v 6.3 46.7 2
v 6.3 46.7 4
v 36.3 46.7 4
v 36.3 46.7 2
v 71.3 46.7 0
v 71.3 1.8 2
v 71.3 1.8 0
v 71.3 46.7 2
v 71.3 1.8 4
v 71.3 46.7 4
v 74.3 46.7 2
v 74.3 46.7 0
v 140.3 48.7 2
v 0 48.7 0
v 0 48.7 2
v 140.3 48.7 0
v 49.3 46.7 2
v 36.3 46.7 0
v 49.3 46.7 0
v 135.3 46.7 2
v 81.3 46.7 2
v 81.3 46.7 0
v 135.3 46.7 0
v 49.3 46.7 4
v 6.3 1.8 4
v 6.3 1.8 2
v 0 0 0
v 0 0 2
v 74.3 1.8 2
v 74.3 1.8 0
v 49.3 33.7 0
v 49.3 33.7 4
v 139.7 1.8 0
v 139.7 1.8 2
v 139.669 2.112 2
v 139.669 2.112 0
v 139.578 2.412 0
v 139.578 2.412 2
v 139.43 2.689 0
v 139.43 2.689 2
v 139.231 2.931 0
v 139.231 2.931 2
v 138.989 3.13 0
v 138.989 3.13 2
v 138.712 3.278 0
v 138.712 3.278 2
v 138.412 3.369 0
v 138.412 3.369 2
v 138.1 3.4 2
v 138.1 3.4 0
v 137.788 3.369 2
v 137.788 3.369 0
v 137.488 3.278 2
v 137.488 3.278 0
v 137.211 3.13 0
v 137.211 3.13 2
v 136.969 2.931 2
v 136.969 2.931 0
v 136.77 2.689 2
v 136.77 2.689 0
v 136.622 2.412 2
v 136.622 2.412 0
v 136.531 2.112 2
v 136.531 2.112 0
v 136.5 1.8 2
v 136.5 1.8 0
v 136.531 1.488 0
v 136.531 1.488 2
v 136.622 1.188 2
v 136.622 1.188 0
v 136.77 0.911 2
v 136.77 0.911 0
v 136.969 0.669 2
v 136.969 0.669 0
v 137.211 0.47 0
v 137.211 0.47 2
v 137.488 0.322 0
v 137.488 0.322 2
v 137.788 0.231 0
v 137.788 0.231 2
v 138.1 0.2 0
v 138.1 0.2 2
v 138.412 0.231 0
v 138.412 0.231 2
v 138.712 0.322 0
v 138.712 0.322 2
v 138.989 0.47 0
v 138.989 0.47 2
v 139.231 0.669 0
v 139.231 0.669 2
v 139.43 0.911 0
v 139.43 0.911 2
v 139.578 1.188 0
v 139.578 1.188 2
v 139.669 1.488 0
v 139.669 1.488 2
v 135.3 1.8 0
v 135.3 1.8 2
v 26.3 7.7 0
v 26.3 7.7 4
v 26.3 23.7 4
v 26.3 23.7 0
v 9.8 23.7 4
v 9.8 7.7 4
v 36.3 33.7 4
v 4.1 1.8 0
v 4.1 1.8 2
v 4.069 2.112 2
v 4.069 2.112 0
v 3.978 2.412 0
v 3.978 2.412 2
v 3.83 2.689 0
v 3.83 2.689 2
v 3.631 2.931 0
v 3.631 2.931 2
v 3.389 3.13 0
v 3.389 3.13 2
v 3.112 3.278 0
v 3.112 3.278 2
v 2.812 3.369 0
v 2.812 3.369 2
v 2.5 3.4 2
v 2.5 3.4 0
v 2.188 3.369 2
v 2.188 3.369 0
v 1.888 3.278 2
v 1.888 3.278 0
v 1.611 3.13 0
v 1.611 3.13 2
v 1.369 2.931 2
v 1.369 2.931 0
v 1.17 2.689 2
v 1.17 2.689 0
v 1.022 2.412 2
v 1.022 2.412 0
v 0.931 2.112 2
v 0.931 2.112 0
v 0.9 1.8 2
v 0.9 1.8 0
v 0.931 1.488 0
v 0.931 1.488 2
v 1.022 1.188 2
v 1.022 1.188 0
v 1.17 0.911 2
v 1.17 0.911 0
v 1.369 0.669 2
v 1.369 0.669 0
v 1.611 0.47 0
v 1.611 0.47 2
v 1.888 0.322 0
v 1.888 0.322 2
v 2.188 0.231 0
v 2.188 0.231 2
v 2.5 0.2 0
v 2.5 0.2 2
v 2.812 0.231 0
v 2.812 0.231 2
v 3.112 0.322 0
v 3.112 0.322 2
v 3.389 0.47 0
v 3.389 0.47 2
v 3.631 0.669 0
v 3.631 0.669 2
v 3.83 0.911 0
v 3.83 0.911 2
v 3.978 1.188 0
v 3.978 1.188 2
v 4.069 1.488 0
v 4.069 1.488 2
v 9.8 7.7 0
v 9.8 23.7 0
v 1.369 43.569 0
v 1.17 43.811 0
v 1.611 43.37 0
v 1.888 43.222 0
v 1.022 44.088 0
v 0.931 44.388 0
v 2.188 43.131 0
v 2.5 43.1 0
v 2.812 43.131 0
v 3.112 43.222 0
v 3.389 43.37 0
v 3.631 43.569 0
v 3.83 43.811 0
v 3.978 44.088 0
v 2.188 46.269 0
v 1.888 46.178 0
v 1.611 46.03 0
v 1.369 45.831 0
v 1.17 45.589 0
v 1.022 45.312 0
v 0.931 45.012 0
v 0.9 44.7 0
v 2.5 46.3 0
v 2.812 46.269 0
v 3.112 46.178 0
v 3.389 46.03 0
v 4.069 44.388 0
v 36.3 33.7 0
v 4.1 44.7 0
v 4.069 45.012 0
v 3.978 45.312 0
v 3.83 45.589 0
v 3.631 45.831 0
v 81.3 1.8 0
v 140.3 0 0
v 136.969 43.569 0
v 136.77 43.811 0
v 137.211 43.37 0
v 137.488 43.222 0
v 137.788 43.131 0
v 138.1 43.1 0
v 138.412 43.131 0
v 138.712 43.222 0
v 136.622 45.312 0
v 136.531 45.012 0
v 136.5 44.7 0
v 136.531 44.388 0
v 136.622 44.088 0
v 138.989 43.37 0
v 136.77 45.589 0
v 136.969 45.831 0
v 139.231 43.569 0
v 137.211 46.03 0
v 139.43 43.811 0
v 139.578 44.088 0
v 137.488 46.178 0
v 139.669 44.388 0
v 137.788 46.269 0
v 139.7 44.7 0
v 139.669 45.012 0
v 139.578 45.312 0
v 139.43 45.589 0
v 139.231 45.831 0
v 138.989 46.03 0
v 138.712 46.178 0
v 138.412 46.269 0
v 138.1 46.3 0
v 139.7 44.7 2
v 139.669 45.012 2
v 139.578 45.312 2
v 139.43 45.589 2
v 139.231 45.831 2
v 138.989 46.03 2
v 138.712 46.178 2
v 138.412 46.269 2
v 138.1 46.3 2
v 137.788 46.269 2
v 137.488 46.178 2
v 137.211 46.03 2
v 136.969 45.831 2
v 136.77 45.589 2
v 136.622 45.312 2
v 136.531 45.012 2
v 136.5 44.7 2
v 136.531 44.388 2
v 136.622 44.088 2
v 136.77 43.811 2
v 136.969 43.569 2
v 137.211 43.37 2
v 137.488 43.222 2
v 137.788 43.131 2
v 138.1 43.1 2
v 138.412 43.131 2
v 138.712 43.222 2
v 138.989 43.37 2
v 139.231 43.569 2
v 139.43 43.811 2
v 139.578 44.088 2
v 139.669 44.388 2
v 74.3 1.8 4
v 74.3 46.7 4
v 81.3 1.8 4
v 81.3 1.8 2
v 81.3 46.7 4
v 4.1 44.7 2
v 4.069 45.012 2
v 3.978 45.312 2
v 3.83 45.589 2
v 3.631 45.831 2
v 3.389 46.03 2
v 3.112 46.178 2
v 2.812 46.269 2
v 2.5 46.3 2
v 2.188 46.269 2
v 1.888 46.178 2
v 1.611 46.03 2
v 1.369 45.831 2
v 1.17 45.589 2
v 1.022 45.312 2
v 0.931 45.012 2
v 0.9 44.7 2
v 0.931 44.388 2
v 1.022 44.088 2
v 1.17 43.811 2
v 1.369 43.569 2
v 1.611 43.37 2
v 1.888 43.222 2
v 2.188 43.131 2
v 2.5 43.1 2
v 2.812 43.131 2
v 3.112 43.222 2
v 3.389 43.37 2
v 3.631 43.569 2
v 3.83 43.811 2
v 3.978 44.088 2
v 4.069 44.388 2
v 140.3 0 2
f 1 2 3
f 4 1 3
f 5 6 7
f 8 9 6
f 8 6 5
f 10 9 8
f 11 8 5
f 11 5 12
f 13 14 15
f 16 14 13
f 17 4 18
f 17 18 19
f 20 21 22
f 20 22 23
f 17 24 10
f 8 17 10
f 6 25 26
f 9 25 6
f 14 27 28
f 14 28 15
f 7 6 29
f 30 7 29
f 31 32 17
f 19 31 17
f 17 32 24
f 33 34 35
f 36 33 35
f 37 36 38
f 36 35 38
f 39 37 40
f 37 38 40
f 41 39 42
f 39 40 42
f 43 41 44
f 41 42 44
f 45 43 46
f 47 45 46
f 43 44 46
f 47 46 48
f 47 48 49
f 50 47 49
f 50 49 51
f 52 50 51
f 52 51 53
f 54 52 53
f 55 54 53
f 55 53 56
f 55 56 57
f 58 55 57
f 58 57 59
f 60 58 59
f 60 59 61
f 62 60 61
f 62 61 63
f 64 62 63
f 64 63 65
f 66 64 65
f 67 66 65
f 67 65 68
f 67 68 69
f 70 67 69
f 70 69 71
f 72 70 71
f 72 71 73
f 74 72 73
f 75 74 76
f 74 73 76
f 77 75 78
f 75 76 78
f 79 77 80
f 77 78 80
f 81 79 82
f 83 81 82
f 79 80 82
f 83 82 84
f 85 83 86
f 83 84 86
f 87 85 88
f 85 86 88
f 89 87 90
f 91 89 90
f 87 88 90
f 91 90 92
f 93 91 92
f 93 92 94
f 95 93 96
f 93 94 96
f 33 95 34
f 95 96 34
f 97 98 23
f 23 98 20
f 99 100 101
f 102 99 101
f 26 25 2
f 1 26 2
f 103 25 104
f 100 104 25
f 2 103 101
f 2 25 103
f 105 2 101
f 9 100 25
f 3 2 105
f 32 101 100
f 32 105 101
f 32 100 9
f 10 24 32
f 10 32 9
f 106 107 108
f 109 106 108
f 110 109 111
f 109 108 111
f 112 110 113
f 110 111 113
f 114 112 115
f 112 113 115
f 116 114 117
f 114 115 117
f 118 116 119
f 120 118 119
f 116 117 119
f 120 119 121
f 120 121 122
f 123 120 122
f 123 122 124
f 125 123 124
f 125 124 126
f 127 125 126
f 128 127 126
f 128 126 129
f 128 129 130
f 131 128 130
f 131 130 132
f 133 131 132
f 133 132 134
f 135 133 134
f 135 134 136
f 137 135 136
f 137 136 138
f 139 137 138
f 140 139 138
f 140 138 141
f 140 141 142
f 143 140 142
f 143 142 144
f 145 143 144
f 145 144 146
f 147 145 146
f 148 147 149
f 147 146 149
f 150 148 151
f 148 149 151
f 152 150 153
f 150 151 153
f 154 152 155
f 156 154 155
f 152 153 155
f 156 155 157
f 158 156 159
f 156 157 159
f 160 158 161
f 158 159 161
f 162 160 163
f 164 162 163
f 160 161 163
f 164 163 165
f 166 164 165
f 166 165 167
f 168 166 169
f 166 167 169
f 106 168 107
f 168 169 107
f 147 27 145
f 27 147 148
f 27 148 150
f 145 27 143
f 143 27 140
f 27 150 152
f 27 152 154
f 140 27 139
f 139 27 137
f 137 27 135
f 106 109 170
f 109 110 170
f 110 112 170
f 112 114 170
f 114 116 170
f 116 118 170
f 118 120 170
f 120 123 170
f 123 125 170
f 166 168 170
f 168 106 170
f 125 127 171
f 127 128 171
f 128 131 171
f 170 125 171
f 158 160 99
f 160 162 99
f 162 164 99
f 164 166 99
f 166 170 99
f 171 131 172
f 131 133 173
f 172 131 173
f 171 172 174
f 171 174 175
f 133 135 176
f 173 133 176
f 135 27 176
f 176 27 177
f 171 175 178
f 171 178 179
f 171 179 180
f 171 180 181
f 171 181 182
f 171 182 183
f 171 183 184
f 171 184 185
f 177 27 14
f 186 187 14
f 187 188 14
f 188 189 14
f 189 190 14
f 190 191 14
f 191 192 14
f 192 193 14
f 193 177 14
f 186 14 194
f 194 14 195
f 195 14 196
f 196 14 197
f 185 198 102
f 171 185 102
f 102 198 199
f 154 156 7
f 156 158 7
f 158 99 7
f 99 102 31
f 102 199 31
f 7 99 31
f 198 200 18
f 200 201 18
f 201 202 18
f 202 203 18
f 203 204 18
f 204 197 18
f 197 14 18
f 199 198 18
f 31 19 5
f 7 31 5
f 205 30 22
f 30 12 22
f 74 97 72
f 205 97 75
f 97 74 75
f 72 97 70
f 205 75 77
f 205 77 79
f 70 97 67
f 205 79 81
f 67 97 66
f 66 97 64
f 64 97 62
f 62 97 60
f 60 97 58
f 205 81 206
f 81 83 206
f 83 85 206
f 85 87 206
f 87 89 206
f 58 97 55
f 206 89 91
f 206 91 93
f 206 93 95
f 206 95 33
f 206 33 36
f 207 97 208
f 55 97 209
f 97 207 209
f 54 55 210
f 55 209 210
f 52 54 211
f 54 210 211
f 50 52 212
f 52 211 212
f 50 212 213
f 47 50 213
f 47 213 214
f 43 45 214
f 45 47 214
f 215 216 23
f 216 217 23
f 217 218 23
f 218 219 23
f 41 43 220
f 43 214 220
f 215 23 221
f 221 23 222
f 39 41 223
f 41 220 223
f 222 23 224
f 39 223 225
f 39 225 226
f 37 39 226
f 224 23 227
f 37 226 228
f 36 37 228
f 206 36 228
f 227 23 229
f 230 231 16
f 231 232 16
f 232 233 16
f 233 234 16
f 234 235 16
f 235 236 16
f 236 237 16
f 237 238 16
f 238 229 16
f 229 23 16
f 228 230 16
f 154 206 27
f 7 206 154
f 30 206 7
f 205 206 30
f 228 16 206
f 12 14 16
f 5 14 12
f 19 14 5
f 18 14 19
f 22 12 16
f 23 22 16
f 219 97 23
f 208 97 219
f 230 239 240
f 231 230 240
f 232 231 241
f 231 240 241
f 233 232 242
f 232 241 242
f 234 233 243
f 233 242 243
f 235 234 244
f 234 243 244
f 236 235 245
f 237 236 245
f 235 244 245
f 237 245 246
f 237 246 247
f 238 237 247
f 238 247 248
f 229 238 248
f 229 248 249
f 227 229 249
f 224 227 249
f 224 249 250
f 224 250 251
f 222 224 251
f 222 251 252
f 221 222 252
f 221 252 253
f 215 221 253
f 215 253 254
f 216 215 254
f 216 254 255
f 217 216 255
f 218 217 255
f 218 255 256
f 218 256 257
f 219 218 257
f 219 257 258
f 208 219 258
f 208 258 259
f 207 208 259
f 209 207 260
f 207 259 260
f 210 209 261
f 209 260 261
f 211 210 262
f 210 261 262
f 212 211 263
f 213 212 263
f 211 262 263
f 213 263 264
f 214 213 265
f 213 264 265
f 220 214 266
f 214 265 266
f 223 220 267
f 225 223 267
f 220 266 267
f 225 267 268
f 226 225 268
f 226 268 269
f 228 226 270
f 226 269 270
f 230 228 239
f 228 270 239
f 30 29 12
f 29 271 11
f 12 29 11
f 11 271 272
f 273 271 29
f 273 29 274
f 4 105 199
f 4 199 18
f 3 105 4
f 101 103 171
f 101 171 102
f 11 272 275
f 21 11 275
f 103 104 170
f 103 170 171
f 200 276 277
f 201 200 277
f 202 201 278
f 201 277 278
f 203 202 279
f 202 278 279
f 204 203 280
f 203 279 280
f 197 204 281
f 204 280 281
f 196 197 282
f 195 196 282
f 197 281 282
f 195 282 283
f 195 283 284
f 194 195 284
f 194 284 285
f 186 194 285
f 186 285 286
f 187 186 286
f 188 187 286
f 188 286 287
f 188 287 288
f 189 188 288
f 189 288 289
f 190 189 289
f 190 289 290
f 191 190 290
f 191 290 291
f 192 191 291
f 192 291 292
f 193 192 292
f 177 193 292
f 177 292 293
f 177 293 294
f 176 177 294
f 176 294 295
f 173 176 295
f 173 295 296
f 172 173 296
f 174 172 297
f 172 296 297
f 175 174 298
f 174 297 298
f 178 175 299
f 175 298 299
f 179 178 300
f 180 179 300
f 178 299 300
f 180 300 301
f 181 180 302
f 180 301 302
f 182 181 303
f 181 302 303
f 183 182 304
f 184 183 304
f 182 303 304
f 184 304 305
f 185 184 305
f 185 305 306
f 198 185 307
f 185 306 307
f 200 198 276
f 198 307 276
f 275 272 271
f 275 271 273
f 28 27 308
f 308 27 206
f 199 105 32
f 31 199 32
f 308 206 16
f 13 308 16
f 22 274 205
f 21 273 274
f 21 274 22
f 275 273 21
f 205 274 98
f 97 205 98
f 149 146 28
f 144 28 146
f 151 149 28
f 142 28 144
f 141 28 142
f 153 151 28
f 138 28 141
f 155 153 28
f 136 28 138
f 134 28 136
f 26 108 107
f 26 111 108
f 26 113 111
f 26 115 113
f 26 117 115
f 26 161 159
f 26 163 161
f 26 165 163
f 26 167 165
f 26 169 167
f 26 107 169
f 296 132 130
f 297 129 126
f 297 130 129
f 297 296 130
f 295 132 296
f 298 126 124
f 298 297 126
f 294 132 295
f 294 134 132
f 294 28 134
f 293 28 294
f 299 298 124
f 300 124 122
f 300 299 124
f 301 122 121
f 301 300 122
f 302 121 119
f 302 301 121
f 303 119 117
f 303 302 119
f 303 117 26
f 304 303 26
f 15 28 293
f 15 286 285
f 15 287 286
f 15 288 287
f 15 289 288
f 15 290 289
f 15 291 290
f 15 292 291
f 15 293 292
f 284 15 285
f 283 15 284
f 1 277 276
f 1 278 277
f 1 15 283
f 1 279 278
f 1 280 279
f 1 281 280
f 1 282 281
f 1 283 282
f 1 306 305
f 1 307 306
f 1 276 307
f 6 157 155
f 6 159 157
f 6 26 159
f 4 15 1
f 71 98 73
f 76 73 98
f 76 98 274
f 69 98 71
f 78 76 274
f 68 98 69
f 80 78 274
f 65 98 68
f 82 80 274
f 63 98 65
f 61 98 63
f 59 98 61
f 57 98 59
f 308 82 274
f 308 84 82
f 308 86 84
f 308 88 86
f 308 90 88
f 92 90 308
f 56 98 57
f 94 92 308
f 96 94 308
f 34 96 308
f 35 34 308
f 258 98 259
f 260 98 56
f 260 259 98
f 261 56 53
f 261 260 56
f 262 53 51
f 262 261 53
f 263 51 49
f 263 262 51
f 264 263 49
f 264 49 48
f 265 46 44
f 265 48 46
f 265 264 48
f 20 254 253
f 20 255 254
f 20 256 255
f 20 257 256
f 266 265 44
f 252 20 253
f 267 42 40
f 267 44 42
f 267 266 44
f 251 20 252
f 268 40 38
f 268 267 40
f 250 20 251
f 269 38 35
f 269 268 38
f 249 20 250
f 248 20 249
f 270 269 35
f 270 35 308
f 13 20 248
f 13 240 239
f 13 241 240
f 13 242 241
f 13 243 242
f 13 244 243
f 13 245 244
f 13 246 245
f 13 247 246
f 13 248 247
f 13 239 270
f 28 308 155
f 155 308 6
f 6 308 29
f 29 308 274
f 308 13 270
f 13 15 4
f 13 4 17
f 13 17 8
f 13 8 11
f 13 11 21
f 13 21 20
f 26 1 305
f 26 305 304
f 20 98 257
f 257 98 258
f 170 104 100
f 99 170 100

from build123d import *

# Parameters (mm, degrees)
SKETCH_2_W               = 140.3
SKETCH_2_H               = 48.7
EXTRUDE_1_DEPTH          = 4
SKETCH_3_W               = 140.3
SKETCH_3_H               = 48.7
SKETCH_3_R               = 1.6
SKETCH_3_W_2             = 129
SKETCH_3_H_2             = 44.9
CUT_EXTRUDE_1_DEPTH      = 2
SKETCH_6_W               = 54
SKETCH_6_H               = 44.9
SKETCH_6_W_2             = 3
SKETCH_6_W_3             = 13
SKETCH_6_H_2             = 13
SKETCH_6_W_4             = 10
SKETCH_6_H_3             = 16
SKETCH_6_R               = 1.6
CUT_EXTRUDE_2_DEPTH      = 149.565743023
CUT_EXTRUDE_3_DEPTH      = 149.565743023
CUT_EXTRUDE_3_DEPTH_BACK = 10
SKETCH_7_W               = 6.5
SKETCH_7_H               = 16


with BuildPart() as part:
    # 草图2 → 凸台-拉伸1 (new body)
    with BuildSketch(Plane.XY):
        with Locations((70.15, 24.35)):
            Rectangle(SKETCH_2_W, SKETCH_2_H)
    extrude(amount=EXTRUDE_1_DEPTH)

    # 草图3 → 切除-拉伸1 (cut)
    with BuildSketch(Plane.XY.offset(4)):
        with Locations((70.15, 24.35)):
            Rectangle(SKETCH_3_W, SKETCH_3_H)
        with Locations((138.1, 1.8)):
            Circle(SKETCH_3_R, mode=Mode.SUBTRACT)
        with Locations((138.1, 44.7)):
            Circle(SKETCH_3_R, mode=Mode.SUBTRACT)
        with Locations((2.5, 1.8)):
            Circle(SKETCH_3_R, mode=Mode.SUBTRACT)
        with Locations((2.5, 44.7)):
            Circle(SKETCH_3_R, mode=Mode.SUBTRACT)
        with Locations((70.8, 24.25)):
            Rectangle(SKETCH_3_W_2, SKETCH_3_H_2, mode=Mode.SUBTRACT)
    extrude(amount=-CUT_EXTRUDE_1_DEPTH, mode=Mode.SUBTRACT)

    # 草图6 → 切除-拉伸2 (cut, through all)
    with BuildSketch(Plane.XY.offset(4)):
        with Locations((108.3, 24.25)):
            Rectangle(SKETCH_6_W, SKETCH_6_H)
        with Locations((72.8, 24.25)):
            Rectangle(SKETCH_6_W_2, SKETCH_6_H)
        with Locations((42.8, 40.2)):
            Rectangle(SKETCH_6_W_3, SKETCH_6_H_2)
        with Locations((21.3, 15.7)):
            Rectangle(SKETCH_6_W_4, SKETCH_6_H_3)
        with Locations((2.5, 44.7)):
            Circle(SKETCH_6_R)
        with Locations((2.5, 1.8)):
            Circle(SKETCH_6_R)
        with Locations((138.1, 44.7)):
            Circle(SKETCH_6_R)
        with Locations((138.1, 1.8)):
            Circle(SKETCH_6_R)
    extrude(amount=-CUT_EXTRUDE_2_DEPTH, mode=Mode.SUBTRACT)

    # 草图7 → 切除-拉伸3 (cut, two sides: drawn at the far end of the back side and taken through both)
    with BuildSketch(Plane(origin=(0, 0, 0), x_dir=(-1, 0, 0), z_dir=(0, 0, -1)).offset(-CUT_EXTRUDE_3_DEPTH_BACK)):
        with Locations((-13.05, 15.7)):
            Rectangle(SKETCH_7_W, SKETCH_7_H)
    extrude(amount=CUT_EXTRUDE_3_DEPTH + CUT_EXTRUDE_3_DEPTH_BACK, mode=Mode.SUBTRACT)


solid = part.part
